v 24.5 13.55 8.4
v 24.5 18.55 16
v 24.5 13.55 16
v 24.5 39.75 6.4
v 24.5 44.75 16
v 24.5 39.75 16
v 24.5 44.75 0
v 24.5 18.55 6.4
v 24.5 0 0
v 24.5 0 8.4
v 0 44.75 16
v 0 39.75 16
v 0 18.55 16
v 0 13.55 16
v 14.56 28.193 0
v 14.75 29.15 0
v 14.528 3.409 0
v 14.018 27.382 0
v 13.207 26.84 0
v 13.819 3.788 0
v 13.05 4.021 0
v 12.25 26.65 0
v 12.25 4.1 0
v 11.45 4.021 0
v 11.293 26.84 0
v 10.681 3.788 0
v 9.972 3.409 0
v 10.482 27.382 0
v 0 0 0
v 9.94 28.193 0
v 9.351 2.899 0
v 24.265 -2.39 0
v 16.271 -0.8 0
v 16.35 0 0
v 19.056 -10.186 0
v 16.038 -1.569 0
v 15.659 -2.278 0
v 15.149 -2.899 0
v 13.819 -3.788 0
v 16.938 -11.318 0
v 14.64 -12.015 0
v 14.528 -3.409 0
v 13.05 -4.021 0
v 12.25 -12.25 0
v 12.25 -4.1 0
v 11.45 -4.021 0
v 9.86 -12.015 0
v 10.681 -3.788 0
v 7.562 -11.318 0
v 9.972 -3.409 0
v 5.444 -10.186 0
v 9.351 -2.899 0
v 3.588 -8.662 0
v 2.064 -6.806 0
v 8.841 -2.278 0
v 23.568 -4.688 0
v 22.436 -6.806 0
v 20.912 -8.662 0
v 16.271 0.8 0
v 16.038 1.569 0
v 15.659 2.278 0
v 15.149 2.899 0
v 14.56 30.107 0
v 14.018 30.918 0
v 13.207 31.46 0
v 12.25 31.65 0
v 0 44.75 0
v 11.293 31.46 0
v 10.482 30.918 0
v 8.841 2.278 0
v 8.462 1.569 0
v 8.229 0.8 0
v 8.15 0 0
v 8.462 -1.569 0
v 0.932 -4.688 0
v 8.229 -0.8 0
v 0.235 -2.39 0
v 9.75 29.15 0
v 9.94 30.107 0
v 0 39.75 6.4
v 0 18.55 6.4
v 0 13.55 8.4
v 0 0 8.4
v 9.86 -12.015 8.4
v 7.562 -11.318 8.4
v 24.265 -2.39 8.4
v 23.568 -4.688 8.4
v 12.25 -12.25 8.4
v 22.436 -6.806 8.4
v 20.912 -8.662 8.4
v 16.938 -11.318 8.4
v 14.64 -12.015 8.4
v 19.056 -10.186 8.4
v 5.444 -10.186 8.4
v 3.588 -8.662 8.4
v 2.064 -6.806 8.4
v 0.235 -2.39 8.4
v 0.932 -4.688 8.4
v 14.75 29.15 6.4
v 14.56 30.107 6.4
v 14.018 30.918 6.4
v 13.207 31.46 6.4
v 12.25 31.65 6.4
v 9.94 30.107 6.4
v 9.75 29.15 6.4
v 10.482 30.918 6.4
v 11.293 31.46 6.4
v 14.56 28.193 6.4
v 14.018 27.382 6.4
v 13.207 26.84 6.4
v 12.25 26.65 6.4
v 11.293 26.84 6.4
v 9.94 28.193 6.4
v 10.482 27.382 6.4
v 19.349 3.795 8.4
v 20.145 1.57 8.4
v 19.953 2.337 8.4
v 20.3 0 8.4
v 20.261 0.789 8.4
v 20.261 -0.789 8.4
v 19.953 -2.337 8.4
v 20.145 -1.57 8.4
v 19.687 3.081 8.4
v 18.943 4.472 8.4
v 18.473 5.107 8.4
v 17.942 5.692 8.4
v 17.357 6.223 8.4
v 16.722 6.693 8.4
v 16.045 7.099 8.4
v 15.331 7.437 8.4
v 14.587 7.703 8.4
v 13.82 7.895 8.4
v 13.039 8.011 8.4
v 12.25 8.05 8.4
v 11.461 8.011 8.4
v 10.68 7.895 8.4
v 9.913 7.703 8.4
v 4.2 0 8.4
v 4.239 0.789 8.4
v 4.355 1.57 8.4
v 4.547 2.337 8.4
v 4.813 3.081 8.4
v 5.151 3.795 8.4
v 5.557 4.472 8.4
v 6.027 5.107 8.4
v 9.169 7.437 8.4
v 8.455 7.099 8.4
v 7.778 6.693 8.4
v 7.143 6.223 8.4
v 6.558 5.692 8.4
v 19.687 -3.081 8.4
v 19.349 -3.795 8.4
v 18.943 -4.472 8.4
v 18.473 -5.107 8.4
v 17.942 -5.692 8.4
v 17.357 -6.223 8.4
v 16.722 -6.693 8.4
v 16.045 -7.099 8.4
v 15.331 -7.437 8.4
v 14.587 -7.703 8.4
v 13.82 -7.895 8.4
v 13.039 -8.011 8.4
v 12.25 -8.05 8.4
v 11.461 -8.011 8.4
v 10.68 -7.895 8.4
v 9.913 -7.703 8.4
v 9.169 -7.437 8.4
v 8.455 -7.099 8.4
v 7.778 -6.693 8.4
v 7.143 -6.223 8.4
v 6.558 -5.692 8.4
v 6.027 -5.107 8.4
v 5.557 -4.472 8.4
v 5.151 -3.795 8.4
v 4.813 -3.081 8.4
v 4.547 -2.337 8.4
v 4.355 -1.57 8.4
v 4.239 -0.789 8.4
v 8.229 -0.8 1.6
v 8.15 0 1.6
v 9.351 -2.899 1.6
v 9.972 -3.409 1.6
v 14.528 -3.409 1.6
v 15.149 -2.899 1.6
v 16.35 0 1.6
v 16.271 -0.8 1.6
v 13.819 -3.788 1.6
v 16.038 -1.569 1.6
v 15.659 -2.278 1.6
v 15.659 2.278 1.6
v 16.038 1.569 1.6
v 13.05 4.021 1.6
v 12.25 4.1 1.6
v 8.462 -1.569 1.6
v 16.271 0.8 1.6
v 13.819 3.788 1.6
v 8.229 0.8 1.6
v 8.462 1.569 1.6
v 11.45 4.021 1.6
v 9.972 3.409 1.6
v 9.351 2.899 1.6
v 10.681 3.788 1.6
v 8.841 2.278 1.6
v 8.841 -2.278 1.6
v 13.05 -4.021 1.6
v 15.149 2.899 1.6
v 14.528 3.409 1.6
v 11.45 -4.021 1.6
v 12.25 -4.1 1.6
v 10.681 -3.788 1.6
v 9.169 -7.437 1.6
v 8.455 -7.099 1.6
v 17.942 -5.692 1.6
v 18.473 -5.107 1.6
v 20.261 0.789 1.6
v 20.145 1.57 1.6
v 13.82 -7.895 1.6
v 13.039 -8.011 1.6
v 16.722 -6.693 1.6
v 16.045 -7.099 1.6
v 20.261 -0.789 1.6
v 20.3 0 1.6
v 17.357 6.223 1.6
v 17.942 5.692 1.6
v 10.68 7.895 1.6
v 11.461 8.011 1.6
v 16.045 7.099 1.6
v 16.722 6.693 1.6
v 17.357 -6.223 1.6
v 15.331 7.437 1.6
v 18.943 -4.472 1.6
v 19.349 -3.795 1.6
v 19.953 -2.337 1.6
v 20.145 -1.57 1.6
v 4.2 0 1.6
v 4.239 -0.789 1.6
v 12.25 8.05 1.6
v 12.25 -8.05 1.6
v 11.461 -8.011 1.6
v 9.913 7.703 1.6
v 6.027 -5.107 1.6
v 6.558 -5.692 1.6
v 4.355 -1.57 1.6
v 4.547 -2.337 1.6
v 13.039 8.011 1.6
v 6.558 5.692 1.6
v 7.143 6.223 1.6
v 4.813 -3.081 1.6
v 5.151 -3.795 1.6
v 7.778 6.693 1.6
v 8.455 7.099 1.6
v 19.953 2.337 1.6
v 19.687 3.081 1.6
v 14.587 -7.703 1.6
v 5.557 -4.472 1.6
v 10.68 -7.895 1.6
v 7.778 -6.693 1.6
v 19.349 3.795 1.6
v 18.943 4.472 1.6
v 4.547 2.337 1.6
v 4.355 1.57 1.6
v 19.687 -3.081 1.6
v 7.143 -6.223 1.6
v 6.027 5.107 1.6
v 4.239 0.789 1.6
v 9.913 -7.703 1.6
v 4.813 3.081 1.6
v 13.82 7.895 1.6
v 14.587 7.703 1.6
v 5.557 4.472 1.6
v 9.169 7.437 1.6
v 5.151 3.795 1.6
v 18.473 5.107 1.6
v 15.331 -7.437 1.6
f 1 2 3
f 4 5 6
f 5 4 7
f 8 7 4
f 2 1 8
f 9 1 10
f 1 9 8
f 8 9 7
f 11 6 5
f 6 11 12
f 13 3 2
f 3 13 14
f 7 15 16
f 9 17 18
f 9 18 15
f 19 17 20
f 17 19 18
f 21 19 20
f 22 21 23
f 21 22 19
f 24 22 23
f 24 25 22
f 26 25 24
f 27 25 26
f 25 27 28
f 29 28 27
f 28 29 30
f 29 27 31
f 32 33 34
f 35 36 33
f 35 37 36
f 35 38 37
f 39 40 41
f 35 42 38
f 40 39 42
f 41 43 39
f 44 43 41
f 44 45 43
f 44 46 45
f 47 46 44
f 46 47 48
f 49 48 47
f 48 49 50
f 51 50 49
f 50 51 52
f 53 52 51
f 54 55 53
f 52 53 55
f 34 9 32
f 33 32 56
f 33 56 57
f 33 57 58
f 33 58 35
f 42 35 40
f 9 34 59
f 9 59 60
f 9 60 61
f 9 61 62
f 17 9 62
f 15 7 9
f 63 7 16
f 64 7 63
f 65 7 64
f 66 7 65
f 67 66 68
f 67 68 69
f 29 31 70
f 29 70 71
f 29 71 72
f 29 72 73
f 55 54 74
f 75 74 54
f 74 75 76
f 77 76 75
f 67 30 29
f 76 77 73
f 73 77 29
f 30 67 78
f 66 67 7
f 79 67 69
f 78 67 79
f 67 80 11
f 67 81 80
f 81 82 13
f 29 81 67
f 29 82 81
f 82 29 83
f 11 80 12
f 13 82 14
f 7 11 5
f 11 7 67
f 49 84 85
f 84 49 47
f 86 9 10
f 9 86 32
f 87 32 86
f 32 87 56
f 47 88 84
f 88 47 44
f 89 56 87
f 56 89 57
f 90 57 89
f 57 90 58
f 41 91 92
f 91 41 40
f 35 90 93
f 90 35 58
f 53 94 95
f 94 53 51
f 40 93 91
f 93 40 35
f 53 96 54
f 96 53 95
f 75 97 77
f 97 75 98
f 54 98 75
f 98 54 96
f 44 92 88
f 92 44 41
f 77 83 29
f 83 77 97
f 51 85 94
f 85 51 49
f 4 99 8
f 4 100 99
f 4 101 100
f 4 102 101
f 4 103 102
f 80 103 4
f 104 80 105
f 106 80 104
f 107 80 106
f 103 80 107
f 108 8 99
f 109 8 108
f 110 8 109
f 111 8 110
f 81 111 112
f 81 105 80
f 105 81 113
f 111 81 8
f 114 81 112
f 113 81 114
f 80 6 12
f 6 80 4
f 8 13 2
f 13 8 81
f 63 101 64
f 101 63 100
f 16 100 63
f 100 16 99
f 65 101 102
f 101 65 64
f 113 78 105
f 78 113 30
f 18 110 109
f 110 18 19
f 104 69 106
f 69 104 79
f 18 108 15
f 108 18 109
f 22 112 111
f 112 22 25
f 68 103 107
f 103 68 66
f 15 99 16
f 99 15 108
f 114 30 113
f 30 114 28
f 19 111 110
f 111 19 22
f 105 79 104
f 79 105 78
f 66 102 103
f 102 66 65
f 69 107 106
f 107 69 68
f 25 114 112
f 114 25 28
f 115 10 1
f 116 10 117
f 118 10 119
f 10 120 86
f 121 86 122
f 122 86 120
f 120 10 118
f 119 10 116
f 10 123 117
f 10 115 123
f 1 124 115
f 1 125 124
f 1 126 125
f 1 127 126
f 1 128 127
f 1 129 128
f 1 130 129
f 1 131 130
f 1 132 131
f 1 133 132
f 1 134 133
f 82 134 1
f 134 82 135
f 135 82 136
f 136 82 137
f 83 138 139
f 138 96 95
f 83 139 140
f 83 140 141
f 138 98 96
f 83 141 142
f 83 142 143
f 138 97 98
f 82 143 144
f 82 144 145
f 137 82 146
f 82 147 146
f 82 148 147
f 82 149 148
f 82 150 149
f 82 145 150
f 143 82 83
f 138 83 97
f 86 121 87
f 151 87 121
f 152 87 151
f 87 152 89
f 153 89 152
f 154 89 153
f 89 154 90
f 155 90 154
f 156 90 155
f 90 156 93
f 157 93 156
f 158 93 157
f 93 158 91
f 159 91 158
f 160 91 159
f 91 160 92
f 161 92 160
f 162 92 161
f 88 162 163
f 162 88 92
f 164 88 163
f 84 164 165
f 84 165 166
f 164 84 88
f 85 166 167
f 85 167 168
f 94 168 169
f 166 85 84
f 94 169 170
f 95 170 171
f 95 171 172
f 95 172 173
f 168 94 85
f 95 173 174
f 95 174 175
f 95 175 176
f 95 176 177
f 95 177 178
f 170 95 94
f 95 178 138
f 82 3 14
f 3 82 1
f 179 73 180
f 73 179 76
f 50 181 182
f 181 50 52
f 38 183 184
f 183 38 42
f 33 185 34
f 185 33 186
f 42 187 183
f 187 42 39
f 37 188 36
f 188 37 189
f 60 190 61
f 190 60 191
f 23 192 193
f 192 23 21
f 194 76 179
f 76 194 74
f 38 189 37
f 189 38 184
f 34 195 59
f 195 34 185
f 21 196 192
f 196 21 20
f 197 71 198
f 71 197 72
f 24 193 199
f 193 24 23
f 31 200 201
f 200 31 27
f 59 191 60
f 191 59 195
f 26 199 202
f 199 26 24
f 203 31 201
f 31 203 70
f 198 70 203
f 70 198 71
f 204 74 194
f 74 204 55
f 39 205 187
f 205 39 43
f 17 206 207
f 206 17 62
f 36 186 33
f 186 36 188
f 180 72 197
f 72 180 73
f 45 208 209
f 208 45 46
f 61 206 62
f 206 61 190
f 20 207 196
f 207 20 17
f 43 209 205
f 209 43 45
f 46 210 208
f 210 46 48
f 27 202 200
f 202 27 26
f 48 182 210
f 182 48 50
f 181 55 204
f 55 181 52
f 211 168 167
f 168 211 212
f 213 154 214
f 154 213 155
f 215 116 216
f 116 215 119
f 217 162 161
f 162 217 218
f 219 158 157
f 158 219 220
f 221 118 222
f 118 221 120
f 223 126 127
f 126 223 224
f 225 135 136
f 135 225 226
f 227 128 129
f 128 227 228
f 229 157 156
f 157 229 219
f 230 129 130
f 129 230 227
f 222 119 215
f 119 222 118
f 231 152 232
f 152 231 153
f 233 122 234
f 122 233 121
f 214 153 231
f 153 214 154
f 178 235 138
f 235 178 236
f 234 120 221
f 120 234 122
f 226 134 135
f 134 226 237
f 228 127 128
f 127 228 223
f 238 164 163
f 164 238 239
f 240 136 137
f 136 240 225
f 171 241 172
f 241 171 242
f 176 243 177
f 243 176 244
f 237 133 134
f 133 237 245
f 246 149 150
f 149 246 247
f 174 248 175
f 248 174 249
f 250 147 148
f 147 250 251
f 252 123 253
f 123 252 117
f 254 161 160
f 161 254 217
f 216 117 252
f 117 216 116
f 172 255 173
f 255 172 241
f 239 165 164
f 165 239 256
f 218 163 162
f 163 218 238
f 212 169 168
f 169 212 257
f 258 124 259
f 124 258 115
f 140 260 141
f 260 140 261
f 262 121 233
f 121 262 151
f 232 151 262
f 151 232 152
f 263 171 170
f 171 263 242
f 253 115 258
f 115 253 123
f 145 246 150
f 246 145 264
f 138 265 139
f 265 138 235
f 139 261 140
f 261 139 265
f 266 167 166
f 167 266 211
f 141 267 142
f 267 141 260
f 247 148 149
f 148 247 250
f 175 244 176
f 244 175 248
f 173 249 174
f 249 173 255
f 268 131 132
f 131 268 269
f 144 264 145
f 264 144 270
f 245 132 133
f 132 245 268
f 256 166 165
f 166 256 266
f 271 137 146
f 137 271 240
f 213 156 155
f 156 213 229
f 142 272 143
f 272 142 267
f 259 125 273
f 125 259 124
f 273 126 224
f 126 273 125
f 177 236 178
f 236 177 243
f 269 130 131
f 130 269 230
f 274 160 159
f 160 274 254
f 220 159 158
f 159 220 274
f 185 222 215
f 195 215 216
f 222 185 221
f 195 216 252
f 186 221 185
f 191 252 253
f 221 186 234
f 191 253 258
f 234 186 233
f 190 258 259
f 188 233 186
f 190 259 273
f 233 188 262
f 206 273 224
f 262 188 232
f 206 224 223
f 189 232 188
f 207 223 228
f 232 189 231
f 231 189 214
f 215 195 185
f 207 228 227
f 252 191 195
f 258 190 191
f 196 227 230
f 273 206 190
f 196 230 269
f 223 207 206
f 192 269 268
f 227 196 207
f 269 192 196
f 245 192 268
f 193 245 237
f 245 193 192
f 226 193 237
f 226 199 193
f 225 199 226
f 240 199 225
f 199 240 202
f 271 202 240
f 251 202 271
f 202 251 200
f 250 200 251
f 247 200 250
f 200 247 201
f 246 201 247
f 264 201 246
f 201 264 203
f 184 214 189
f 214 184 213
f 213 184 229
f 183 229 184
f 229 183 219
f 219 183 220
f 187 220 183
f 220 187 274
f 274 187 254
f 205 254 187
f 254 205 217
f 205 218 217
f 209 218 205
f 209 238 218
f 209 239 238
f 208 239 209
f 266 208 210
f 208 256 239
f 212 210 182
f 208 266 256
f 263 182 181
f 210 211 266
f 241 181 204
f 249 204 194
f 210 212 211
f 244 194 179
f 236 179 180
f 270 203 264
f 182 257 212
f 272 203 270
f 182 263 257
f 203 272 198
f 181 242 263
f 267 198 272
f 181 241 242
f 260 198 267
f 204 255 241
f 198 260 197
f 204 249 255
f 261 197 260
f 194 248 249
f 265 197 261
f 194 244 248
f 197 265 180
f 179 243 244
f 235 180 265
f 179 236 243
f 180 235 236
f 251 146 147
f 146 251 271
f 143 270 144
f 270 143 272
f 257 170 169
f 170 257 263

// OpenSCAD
//customisation alfawise c10 - axe X pièce existante pour info (pas nécessaire de la réimprimer)
echo(version=version());

epsilon=0.1;
diam_vis=8.2;
diam_roulement=16+epsilon;
diam_fixation=5;
largeur=24.5;
hauteur=16;
longueur=57;
haut_roulement=6+epsilon;
haut_encoche=hauteur-6.3;
haut_vis=hauteur-8.3;
long_encoche=21+2*epsilon;
long_guide=5;
long_vis=longueur-long_encoche-2*long_guide;

module prism(l, w, h){
    polyhedron(
    points=[[0,0,0], [l,0,0], [l,w,0], [0,w,0], [0,w,h], [l,w,h]],
    faces=[[0,1,2,3],[5,4,3,2],[0,4,5,1],[0,3,4],[5,2,1]]
    );
}


difference(){
    //forme de base
    union(){
        cube([largeur,longueur-(largeur/2),hauteur],0);
        translate([(largeur/2),0,0]){
            cylinder(hauteur,(largeur/2),(largeur/2),$fn=32);
        }
    }
    //retraits
    union(){
        //encoche rail
        translate([-epsilon,longueur-(largeur/2)-(long_guide+long_encoche),hauteur-haut_encoche+epsilon]){
            cube([largeur+2*epsilon,long_encoche,haut_encoche],0);
        }
        //trou fixation
        translate([(largeur/2),longueur-(largeur/2)-(long_guide+long_encoche/2),-epsilon]){
            cylinder(hauteur+2*epsilon,diam_fixation/2,diam_fixation/2,$fn=16);
        }
        //encoche vis
        translate([-epsilon,-(largeur/2),hauteur-haut_vis+epsilon]){
            cube([largeur+2*epsilon,long_vis,haut_vis],0);
        }
        //trou vis
        translate([(largeur/2),0,-epsilon]){
            cylinder(hauteur+2*epsilon,diam_vis/2,diam_vis/2,$fn=32);
        }
        //trou roulement
        translate([(largeur/2),0,haut_vis-haut_roulement]){
            cylinder(hauteur+2*epsilon,diam_roulement/2,diam_roulement/2,$fn=64);
        }
    }
}
